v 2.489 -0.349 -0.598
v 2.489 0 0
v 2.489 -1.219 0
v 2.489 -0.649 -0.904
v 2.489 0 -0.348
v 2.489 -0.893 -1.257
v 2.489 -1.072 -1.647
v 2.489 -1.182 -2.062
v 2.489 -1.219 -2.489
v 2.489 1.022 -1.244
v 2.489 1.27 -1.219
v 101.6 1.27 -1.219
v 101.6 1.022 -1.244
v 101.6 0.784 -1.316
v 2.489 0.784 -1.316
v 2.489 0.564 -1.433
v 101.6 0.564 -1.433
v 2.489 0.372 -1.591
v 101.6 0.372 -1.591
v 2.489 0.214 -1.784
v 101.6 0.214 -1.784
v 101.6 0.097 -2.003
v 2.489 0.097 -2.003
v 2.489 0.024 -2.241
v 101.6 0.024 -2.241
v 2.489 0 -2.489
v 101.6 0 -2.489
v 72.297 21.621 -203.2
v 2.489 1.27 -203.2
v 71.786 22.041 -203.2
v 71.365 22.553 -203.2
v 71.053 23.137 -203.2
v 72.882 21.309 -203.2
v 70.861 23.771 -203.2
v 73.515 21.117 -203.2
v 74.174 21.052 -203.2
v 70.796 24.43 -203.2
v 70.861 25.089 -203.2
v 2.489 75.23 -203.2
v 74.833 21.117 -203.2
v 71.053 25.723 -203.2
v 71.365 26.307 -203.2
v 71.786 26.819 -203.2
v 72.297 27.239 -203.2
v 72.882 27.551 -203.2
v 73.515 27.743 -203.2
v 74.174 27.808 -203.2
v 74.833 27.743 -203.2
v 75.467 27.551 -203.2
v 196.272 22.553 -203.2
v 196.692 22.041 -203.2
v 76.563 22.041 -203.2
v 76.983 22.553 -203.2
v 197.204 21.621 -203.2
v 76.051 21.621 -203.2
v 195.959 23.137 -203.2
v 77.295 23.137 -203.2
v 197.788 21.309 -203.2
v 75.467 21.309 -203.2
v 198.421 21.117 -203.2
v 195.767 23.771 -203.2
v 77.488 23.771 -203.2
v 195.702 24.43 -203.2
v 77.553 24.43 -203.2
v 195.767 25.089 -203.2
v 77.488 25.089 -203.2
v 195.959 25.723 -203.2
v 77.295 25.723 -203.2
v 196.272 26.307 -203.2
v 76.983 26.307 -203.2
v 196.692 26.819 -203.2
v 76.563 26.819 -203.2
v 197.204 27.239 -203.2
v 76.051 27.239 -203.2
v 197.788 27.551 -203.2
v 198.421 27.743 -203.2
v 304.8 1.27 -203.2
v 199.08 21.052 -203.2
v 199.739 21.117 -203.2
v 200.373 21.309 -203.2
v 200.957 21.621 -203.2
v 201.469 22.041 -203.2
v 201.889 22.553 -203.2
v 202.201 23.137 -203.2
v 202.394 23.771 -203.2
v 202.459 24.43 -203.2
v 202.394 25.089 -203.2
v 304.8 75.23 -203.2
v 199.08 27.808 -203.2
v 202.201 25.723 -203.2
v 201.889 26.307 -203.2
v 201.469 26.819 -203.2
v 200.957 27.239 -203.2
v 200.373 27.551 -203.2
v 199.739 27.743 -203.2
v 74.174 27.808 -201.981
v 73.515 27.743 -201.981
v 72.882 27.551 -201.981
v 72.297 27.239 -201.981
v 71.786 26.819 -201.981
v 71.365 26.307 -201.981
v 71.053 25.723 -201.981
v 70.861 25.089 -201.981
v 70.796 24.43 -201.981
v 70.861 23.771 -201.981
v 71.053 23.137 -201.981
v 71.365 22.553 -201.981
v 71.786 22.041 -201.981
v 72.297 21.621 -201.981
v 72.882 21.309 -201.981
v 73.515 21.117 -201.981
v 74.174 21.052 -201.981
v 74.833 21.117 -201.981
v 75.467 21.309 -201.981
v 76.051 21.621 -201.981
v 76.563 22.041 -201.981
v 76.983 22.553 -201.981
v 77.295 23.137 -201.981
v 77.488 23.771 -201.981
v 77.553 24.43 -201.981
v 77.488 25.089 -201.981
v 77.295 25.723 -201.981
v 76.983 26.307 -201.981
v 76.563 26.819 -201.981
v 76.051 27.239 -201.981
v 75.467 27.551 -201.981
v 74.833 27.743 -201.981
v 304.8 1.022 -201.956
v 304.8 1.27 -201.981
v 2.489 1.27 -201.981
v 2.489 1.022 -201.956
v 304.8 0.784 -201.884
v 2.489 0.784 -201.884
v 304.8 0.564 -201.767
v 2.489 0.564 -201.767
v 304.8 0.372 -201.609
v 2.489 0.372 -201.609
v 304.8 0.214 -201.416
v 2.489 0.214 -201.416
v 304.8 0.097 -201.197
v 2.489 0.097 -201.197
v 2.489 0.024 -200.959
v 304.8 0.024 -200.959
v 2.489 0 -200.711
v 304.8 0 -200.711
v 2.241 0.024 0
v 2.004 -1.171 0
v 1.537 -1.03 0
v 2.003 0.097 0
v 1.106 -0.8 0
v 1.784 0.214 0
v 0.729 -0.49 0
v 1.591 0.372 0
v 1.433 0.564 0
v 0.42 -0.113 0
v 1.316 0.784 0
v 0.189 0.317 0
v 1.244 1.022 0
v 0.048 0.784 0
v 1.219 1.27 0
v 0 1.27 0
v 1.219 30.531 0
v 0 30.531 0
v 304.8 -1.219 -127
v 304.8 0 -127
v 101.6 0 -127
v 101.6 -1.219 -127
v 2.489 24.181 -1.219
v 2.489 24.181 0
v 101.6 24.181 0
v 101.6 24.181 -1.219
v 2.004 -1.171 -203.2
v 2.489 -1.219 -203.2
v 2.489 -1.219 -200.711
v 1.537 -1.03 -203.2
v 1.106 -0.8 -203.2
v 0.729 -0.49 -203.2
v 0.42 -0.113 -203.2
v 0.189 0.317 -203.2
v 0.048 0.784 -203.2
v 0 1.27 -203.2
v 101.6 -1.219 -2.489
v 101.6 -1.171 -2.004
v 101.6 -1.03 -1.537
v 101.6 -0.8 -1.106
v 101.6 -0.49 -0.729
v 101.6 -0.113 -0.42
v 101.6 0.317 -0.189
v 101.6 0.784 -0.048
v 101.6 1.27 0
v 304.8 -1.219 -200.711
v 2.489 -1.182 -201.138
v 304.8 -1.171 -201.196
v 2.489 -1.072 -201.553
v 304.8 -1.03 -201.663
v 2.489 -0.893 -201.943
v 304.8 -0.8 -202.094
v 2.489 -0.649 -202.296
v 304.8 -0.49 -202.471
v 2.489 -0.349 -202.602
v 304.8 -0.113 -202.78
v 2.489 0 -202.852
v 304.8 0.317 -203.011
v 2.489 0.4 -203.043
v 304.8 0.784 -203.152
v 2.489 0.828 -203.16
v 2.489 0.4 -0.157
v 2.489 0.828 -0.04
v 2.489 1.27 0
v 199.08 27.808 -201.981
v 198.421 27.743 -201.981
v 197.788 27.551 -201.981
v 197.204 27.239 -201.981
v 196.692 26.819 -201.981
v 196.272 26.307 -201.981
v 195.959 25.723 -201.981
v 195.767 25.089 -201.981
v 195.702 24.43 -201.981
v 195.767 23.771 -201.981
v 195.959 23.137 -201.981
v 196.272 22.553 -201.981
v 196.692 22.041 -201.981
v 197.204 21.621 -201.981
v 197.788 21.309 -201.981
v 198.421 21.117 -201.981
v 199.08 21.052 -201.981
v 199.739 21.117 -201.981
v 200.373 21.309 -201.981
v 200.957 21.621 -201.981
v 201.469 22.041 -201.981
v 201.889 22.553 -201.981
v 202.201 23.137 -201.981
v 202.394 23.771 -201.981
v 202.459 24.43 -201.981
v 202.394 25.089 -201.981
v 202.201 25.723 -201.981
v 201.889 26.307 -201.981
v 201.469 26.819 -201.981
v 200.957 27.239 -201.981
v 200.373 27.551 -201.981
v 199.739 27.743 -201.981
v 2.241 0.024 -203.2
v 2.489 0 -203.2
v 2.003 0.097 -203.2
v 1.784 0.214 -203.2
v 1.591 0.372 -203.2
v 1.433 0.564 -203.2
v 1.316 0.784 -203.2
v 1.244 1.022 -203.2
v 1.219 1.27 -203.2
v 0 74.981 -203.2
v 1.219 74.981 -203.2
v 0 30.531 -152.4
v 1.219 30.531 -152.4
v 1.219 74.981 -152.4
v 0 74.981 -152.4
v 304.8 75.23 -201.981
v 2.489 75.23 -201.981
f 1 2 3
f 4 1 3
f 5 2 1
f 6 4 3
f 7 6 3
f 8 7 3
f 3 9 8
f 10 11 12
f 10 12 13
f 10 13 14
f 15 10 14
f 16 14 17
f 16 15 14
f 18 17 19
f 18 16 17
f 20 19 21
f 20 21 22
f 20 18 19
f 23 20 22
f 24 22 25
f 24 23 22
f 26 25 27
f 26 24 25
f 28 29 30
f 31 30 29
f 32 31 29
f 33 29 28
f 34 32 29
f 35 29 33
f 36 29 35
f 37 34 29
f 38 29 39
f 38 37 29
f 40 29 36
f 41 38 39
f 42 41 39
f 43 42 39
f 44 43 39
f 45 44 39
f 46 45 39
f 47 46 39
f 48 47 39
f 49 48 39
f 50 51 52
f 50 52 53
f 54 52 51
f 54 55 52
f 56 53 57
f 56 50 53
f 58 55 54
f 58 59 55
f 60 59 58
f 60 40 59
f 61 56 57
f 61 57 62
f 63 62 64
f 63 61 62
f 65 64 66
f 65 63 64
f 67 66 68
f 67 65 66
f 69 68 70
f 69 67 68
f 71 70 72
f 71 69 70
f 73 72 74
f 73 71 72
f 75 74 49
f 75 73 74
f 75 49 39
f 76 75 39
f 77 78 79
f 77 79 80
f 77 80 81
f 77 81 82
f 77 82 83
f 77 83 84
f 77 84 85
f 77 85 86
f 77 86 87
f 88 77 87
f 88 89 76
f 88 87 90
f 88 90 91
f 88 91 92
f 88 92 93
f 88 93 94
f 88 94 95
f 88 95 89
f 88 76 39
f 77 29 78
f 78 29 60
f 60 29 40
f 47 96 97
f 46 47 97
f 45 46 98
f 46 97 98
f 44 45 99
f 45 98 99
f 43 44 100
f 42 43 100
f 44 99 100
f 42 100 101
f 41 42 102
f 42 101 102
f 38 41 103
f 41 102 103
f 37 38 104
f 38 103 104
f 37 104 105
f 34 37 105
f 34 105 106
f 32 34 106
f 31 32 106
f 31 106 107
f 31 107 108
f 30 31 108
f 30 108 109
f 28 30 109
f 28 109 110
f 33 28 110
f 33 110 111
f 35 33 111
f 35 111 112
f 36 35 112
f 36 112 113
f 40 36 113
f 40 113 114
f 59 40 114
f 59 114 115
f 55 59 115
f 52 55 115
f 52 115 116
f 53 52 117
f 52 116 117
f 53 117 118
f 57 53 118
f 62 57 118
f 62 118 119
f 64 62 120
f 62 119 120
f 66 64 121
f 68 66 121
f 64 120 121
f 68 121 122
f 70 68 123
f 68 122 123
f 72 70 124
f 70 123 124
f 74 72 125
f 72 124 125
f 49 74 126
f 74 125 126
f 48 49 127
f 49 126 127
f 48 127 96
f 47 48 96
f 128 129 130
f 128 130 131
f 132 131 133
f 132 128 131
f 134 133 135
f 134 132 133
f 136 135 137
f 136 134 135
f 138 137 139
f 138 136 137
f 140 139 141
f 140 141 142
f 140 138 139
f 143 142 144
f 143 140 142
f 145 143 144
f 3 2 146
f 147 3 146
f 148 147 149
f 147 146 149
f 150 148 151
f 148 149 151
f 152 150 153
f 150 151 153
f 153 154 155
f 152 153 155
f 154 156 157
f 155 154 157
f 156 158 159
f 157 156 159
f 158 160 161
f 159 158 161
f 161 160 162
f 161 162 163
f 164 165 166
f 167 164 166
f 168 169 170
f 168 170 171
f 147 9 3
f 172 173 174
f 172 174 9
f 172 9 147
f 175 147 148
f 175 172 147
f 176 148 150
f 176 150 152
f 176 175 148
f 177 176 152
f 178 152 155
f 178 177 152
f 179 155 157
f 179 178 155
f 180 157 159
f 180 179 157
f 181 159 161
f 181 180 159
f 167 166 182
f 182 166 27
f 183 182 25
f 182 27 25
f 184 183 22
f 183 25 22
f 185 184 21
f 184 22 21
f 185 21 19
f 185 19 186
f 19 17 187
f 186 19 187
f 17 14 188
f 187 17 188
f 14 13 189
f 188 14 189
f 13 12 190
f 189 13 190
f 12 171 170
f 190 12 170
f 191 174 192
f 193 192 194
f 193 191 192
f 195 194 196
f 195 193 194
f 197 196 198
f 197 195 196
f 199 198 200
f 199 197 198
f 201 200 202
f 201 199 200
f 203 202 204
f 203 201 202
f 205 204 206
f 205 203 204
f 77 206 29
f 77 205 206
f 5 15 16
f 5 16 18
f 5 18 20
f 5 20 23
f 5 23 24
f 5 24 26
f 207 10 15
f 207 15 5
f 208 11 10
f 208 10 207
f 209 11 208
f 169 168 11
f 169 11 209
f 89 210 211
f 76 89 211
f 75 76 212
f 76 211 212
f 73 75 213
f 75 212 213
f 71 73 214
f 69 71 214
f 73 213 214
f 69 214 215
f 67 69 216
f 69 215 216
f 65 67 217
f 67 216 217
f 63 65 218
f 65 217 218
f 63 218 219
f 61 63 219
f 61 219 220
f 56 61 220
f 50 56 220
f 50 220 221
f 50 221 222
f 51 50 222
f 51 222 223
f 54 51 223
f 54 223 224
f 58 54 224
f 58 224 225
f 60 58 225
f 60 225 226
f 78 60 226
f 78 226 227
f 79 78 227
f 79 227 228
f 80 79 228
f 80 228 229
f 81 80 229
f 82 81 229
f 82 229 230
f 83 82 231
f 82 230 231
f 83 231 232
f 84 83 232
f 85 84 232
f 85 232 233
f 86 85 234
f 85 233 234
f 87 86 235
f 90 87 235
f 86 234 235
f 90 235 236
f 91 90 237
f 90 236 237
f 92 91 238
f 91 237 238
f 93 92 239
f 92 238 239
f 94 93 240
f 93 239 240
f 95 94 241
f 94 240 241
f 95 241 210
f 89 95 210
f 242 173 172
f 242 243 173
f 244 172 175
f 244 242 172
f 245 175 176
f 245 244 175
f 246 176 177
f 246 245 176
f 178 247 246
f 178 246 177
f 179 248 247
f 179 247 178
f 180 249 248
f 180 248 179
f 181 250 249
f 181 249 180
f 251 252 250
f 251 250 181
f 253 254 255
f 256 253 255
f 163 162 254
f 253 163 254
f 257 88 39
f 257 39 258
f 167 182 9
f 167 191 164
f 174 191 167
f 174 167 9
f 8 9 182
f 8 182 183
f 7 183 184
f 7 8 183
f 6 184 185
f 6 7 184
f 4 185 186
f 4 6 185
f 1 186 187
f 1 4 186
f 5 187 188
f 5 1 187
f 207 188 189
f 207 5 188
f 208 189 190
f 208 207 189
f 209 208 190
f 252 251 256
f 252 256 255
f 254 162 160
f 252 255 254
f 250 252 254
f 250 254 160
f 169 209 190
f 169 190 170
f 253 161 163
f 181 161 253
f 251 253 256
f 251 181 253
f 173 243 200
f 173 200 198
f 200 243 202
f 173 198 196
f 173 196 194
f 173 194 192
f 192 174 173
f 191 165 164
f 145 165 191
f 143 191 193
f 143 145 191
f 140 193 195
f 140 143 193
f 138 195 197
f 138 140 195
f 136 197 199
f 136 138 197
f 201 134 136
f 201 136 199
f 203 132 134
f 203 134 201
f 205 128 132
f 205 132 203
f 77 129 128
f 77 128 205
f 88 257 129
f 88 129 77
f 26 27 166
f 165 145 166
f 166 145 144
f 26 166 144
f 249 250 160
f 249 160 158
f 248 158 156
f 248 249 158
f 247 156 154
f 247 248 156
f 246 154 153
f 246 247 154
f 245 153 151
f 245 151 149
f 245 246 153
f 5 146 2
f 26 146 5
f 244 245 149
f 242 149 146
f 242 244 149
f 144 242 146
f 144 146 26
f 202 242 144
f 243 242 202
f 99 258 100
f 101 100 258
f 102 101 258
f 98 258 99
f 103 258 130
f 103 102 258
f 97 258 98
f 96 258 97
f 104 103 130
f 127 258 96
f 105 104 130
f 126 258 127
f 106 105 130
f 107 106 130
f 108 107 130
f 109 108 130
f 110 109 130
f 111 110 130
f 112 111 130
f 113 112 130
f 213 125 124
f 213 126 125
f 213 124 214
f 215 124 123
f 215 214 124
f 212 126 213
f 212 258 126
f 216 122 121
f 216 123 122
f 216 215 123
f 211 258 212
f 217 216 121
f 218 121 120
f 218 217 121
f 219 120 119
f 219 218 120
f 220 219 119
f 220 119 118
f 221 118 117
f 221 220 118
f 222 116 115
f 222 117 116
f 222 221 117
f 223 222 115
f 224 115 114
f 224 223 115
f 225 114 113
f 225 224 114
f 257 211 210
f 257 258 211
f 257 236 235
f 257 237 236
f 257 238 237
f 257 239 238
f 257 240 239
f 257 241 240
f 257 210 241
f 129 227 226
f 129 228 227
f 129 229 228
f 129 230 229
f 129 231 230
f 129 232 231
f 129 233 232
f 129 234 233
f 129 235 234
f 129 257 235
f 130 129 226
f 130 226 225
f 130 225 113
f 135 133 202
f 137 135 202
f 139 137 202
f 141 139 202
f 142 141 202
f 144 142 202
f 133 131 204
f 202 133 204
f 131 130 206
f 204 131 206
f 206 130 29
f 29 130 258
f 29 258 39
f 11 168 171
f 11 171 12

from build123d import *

# Parameters (mm, degrees)
BASE_FLANGE1_DEPTH           = 1.2192
EDGE_FLANGE1_STRIP_W         = 7.4168
EDGE_FLANGE1_STRIP_H         = 1.2192
EDGE_FLANGE1_STRIP_CUT_DEPTH = 203.2
EDGE_FLANGE1_DEPTH           = 203.2
EDGE_FLANGE2_STRIP_W         = 7.4168
EDGE_FLANGE2_STRIP_H         = 1.2192
EDGE_FLANGE2_STRIP_CUT_DEPTH = 302.3108
EDGE_FLANGE2_DEPTH           = 302.3108
F_1_4_0_25_DIAMETER_HOLE1_D  = 6.7564
SKETCH15_W                   = 152.4
SKETCH15_H                   = 44.45
CUT_EXTRUDE2_DEPTH           = 373.975962979
F_1_4_0_25_DIAMETER_HOLE3_D  = 6.7564
EDGE_FLANGE3_STRIP_W         = 7.4168
EDGE_FLANGE3_STRIP_H         = 1.2192
EDGE_FLANGE3_STRIP_CUT_DEPTH = 99.1108
EDGE_FLANGE3_DEPTH           = 99.1108


# Sheet-metal steps are written as plain solids
with BuildPart() as part:
    # Sketch1 → Base-Flange1 (new body)
    with BuildSketch(Plane(origin=(0, 0, 0), x_dir=(1, 0, 0), z_dir=(0, 1, 0))):
        Polygon((0, 0), (0, 203.2), (304.8, 203.2), (304.8, 127), (101.6, 127), (101.6, 0), align=None)
    extrude(amount=-BASE_FLANGE1_DEPTH)

    # Edge-Flange1 strip (across the edge) → Edge-Flange1 strip cut (cut)
    with BuildSketch(Plane.XY.offset(-203.2)):
        with Locations((-1.2192, -0.6096)):
            Rectangle(EDGE_FLANGE1_STRIP_W, EDGE_FLANGE1_STRIP_H)
    extrude(amount=EDGE_FLANGE1_STRIP_CUT_DEPTH, mode=Mode.SUBTRACT)

    # Edge-Flange1 section (across the edge) → Edge-Flange1 (add)
    with BuildSketch(Plane.XY.offset(-203.2)):
        with BuildLine():
            Line((0, 1.27), (0, 74.9808))
            Line((0, 74.9808), (1.2192, 74.9808))
            Line((1.2192, 74.9808), (1.2192, 1.27))
            ThreePointArc((1.2192, 1.27), (1.591174388, 0.371974388), (2.4892, 0))
            Line((2.4892, 0), (2.4892, -1.2192))
            ThreePointArc((2.4892, -1.2192), (0.7290698, -0.4901302), (0, 1.27))
        make_face()
    extrude(amount=EDGE_FLANGE1_DEPTH)

    # Edge-Flange2 strip (across the edge) → Edge-Flange2 strip cut (cut)
    with BuildSketch(Plane(origin=(304.8, 0, -203.2), x_dir=(0, 0, 1), z_dir=(-1, 0, 0))):
        with Locations((-1.2192, -0.6096)):
            Rectangle(EDGE_FLANGE2_STRIP_W, EDGE_FLANGE2_STRIP_H)
    extrude(amount=EDGE_FLANGE2_STRIP_CUT_DEPTH, mode=Mode.SUBTRACT)

    # Edge-Flange2 section (across the edge) → Edge-Flange2 (add)
    with BuildSketch(Plane(origin=(304.8, 0, -203.2), x_dir=(0, 0, 1), z_dir=(-1, 0, 0))):
        with BuildLine():
            Line((0, 1.27), (0, 75.229826743))
            Line((0, 75.229826743), (1.2192, 75.229826743))
            Line((1.2192, 75.229826743), (1.2192, 1.27))
            ThreePointArc((1.2192, 1.27), (1.591174388, 0.371974388), (2.4892, 0))
            Line((2.4892, 0), (2.4892, -1.2192))
            ThreePointArc((2.4892, -1.2192), (0.7290698, -0.4901302), (0, 1.27))
        make_face()
    extrude(amount=EDGE_FLANGE2_DEPTH)

    # 1/4 (0.25) Diameter Hole1 (through all)
    with Locations(Plane(origin=(74.174301672, 24.429826743, -203.2), x_dir=(0, -1, 0), z_dir=(0, 0, -1))):
        with Locations((0, 0)):
            Hole(F_1_4_0_25_DIAMETER_HOLE1_D / 2)

    # Sketch15 → Cut-Extrude2 (cut, through all)
    with BuildSketch(Plane(origin=(1.2192, 0, 0), x_dir=(0, 0, -1), z_dir=(1, 0, 0))):
        with Locations((76.2, 52.7558)):
            Rectangle(SKETCH15_W, SKETCH15_H)
    extrude(amount=-CUT_EXTRUDE2_DEPTH, mode=Mode.SUBTRACT)

    # 1/4 (0.25) Diameter Hole3 (through all)
    with Locations(Plane(origin=(199.080372839, 24.429826743, -203.2), x_dir=(0, -1, 0), z_dir=(0, 0, -1))):
        with Locations((0, 0)):
            Hole(F_1_4_0_25_DIAMETER_HOLE3_D / 2)

    # Edge-Flange3 strip (across the edge) → Edge-Flange3 strip cut (cut)
    with BuildSketch(Plane(origin=(2.4892, 0, 0), x_dir=(0, 0, -1), z_dir=(1, 0, 0))):
        with Locations((-1.2192, -0.6096)):
            Rectangle(EDGE_FLANGE3_STRIP_W, EDGE_FLANGE3_STRIP_H)
    extrude(amount=EDGE_FLANGE3_STRIP_CUT_DEPTH, mode=Mode.SUBTRACT)

    # Edge-Flange3 section (across the edge) → Edge-Flange3 (add)
    with BuildSketch(Plane(origin=(2.4892, 0, 0), x_dir=(0, 0, -1), z_dir=(1, 0, 0))):
        with BuildLine():
            Line((0, 1.27), (0, 24.1808))
            Line((0, 24.1808), (1.2192, 24.1808))
            Line((1.2192, 24.1808), (1.2192, 1.27))
            ThreePointArc((1.2192, 1.27), (1.591174388, 0.371974388), (2.4892, 0))
            Line((2.4892, 0), (2.4892, -1.2192))
            ThreePointArc((2.4892, -1.2192), (0.7290698, -0.4901302), (0, 1.27))
        make_face()
    extrude(amount=EDGE_FLANGE3_DEPTH)


solid = part.part
